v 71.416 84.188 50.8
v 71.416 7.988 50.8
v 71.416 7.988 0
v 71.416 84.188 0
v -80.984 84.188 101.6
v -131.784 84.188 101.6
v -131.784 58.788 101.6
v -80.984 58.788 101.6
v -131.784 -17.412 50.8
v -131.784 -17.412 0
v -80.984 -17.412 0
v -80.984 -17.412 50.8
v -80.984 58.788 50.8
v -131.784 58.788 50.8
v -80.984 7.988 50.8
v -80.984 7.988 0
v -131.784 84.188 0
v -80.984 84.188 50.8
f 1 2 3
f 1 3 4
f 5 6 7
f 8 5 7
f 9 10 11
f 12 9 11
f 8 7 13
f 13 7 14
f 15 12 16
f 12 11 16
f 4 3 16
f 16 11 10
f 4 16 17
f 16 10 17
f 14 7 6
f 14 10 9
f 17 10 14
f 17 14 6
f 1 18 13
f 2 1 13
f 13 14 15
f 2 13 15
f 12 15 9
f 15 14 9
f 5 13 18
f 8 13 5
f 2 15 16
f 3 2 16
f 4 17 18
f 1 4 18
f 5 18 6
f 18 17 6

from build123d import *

# Parameters (mm, degrees)
F0_W     = 50.8
F0_H     = 101.6
F1_DEPTH = 50.8
F2_W     = 50.8
F2_H     = 25.4
F3_DEPTH = 50.8
F5_DEPTH = 152.4
F6_W     = 152.4
F6_H     = 50.8
F7_DEPTH = 25.4


with BuildPart() as f1:
    # F0 (on Top) → F1 (new body)
    with BuildSketch(Plane.XY):
        with Locations((-106.38359, 33.388032)):
            Rectangle(F0_W, F0_H)
    extrude(amount=F1_DEPTH)

    # F2 (on face) → F3 (join)
    with BuildSketch(Plane.XY.offset(50.8)):
        with Locations((-106.38359, 71.488032)):
            Rectangle(F2_W, F2_H)
    extrude(amount=F3_DEPTH)

    # F4 (on face) → F5 (join)
    with BuildSketch(Plane.YZ.offset(-80.98359)):
        Polygon((58.788032, 50.8), (7.988032, 50.8), (7.988032, 0), (84.188032, 0), (84.188032, 101.6), (58.788032, 101.6), align=None)
    extrude(amount=F5_DEPTH)

    # F6 (on face) → F7 (cut)
    with BuildSketch(Plane.XZ.offset(-58.788032)):
        with Locations((-4.78359, 76.2)):
            Rectangle(F6_W, F6_H)
    extrude(amount=-F7_DEPTH, mode=Mode.SUBTRACT)


solid = f1.part
